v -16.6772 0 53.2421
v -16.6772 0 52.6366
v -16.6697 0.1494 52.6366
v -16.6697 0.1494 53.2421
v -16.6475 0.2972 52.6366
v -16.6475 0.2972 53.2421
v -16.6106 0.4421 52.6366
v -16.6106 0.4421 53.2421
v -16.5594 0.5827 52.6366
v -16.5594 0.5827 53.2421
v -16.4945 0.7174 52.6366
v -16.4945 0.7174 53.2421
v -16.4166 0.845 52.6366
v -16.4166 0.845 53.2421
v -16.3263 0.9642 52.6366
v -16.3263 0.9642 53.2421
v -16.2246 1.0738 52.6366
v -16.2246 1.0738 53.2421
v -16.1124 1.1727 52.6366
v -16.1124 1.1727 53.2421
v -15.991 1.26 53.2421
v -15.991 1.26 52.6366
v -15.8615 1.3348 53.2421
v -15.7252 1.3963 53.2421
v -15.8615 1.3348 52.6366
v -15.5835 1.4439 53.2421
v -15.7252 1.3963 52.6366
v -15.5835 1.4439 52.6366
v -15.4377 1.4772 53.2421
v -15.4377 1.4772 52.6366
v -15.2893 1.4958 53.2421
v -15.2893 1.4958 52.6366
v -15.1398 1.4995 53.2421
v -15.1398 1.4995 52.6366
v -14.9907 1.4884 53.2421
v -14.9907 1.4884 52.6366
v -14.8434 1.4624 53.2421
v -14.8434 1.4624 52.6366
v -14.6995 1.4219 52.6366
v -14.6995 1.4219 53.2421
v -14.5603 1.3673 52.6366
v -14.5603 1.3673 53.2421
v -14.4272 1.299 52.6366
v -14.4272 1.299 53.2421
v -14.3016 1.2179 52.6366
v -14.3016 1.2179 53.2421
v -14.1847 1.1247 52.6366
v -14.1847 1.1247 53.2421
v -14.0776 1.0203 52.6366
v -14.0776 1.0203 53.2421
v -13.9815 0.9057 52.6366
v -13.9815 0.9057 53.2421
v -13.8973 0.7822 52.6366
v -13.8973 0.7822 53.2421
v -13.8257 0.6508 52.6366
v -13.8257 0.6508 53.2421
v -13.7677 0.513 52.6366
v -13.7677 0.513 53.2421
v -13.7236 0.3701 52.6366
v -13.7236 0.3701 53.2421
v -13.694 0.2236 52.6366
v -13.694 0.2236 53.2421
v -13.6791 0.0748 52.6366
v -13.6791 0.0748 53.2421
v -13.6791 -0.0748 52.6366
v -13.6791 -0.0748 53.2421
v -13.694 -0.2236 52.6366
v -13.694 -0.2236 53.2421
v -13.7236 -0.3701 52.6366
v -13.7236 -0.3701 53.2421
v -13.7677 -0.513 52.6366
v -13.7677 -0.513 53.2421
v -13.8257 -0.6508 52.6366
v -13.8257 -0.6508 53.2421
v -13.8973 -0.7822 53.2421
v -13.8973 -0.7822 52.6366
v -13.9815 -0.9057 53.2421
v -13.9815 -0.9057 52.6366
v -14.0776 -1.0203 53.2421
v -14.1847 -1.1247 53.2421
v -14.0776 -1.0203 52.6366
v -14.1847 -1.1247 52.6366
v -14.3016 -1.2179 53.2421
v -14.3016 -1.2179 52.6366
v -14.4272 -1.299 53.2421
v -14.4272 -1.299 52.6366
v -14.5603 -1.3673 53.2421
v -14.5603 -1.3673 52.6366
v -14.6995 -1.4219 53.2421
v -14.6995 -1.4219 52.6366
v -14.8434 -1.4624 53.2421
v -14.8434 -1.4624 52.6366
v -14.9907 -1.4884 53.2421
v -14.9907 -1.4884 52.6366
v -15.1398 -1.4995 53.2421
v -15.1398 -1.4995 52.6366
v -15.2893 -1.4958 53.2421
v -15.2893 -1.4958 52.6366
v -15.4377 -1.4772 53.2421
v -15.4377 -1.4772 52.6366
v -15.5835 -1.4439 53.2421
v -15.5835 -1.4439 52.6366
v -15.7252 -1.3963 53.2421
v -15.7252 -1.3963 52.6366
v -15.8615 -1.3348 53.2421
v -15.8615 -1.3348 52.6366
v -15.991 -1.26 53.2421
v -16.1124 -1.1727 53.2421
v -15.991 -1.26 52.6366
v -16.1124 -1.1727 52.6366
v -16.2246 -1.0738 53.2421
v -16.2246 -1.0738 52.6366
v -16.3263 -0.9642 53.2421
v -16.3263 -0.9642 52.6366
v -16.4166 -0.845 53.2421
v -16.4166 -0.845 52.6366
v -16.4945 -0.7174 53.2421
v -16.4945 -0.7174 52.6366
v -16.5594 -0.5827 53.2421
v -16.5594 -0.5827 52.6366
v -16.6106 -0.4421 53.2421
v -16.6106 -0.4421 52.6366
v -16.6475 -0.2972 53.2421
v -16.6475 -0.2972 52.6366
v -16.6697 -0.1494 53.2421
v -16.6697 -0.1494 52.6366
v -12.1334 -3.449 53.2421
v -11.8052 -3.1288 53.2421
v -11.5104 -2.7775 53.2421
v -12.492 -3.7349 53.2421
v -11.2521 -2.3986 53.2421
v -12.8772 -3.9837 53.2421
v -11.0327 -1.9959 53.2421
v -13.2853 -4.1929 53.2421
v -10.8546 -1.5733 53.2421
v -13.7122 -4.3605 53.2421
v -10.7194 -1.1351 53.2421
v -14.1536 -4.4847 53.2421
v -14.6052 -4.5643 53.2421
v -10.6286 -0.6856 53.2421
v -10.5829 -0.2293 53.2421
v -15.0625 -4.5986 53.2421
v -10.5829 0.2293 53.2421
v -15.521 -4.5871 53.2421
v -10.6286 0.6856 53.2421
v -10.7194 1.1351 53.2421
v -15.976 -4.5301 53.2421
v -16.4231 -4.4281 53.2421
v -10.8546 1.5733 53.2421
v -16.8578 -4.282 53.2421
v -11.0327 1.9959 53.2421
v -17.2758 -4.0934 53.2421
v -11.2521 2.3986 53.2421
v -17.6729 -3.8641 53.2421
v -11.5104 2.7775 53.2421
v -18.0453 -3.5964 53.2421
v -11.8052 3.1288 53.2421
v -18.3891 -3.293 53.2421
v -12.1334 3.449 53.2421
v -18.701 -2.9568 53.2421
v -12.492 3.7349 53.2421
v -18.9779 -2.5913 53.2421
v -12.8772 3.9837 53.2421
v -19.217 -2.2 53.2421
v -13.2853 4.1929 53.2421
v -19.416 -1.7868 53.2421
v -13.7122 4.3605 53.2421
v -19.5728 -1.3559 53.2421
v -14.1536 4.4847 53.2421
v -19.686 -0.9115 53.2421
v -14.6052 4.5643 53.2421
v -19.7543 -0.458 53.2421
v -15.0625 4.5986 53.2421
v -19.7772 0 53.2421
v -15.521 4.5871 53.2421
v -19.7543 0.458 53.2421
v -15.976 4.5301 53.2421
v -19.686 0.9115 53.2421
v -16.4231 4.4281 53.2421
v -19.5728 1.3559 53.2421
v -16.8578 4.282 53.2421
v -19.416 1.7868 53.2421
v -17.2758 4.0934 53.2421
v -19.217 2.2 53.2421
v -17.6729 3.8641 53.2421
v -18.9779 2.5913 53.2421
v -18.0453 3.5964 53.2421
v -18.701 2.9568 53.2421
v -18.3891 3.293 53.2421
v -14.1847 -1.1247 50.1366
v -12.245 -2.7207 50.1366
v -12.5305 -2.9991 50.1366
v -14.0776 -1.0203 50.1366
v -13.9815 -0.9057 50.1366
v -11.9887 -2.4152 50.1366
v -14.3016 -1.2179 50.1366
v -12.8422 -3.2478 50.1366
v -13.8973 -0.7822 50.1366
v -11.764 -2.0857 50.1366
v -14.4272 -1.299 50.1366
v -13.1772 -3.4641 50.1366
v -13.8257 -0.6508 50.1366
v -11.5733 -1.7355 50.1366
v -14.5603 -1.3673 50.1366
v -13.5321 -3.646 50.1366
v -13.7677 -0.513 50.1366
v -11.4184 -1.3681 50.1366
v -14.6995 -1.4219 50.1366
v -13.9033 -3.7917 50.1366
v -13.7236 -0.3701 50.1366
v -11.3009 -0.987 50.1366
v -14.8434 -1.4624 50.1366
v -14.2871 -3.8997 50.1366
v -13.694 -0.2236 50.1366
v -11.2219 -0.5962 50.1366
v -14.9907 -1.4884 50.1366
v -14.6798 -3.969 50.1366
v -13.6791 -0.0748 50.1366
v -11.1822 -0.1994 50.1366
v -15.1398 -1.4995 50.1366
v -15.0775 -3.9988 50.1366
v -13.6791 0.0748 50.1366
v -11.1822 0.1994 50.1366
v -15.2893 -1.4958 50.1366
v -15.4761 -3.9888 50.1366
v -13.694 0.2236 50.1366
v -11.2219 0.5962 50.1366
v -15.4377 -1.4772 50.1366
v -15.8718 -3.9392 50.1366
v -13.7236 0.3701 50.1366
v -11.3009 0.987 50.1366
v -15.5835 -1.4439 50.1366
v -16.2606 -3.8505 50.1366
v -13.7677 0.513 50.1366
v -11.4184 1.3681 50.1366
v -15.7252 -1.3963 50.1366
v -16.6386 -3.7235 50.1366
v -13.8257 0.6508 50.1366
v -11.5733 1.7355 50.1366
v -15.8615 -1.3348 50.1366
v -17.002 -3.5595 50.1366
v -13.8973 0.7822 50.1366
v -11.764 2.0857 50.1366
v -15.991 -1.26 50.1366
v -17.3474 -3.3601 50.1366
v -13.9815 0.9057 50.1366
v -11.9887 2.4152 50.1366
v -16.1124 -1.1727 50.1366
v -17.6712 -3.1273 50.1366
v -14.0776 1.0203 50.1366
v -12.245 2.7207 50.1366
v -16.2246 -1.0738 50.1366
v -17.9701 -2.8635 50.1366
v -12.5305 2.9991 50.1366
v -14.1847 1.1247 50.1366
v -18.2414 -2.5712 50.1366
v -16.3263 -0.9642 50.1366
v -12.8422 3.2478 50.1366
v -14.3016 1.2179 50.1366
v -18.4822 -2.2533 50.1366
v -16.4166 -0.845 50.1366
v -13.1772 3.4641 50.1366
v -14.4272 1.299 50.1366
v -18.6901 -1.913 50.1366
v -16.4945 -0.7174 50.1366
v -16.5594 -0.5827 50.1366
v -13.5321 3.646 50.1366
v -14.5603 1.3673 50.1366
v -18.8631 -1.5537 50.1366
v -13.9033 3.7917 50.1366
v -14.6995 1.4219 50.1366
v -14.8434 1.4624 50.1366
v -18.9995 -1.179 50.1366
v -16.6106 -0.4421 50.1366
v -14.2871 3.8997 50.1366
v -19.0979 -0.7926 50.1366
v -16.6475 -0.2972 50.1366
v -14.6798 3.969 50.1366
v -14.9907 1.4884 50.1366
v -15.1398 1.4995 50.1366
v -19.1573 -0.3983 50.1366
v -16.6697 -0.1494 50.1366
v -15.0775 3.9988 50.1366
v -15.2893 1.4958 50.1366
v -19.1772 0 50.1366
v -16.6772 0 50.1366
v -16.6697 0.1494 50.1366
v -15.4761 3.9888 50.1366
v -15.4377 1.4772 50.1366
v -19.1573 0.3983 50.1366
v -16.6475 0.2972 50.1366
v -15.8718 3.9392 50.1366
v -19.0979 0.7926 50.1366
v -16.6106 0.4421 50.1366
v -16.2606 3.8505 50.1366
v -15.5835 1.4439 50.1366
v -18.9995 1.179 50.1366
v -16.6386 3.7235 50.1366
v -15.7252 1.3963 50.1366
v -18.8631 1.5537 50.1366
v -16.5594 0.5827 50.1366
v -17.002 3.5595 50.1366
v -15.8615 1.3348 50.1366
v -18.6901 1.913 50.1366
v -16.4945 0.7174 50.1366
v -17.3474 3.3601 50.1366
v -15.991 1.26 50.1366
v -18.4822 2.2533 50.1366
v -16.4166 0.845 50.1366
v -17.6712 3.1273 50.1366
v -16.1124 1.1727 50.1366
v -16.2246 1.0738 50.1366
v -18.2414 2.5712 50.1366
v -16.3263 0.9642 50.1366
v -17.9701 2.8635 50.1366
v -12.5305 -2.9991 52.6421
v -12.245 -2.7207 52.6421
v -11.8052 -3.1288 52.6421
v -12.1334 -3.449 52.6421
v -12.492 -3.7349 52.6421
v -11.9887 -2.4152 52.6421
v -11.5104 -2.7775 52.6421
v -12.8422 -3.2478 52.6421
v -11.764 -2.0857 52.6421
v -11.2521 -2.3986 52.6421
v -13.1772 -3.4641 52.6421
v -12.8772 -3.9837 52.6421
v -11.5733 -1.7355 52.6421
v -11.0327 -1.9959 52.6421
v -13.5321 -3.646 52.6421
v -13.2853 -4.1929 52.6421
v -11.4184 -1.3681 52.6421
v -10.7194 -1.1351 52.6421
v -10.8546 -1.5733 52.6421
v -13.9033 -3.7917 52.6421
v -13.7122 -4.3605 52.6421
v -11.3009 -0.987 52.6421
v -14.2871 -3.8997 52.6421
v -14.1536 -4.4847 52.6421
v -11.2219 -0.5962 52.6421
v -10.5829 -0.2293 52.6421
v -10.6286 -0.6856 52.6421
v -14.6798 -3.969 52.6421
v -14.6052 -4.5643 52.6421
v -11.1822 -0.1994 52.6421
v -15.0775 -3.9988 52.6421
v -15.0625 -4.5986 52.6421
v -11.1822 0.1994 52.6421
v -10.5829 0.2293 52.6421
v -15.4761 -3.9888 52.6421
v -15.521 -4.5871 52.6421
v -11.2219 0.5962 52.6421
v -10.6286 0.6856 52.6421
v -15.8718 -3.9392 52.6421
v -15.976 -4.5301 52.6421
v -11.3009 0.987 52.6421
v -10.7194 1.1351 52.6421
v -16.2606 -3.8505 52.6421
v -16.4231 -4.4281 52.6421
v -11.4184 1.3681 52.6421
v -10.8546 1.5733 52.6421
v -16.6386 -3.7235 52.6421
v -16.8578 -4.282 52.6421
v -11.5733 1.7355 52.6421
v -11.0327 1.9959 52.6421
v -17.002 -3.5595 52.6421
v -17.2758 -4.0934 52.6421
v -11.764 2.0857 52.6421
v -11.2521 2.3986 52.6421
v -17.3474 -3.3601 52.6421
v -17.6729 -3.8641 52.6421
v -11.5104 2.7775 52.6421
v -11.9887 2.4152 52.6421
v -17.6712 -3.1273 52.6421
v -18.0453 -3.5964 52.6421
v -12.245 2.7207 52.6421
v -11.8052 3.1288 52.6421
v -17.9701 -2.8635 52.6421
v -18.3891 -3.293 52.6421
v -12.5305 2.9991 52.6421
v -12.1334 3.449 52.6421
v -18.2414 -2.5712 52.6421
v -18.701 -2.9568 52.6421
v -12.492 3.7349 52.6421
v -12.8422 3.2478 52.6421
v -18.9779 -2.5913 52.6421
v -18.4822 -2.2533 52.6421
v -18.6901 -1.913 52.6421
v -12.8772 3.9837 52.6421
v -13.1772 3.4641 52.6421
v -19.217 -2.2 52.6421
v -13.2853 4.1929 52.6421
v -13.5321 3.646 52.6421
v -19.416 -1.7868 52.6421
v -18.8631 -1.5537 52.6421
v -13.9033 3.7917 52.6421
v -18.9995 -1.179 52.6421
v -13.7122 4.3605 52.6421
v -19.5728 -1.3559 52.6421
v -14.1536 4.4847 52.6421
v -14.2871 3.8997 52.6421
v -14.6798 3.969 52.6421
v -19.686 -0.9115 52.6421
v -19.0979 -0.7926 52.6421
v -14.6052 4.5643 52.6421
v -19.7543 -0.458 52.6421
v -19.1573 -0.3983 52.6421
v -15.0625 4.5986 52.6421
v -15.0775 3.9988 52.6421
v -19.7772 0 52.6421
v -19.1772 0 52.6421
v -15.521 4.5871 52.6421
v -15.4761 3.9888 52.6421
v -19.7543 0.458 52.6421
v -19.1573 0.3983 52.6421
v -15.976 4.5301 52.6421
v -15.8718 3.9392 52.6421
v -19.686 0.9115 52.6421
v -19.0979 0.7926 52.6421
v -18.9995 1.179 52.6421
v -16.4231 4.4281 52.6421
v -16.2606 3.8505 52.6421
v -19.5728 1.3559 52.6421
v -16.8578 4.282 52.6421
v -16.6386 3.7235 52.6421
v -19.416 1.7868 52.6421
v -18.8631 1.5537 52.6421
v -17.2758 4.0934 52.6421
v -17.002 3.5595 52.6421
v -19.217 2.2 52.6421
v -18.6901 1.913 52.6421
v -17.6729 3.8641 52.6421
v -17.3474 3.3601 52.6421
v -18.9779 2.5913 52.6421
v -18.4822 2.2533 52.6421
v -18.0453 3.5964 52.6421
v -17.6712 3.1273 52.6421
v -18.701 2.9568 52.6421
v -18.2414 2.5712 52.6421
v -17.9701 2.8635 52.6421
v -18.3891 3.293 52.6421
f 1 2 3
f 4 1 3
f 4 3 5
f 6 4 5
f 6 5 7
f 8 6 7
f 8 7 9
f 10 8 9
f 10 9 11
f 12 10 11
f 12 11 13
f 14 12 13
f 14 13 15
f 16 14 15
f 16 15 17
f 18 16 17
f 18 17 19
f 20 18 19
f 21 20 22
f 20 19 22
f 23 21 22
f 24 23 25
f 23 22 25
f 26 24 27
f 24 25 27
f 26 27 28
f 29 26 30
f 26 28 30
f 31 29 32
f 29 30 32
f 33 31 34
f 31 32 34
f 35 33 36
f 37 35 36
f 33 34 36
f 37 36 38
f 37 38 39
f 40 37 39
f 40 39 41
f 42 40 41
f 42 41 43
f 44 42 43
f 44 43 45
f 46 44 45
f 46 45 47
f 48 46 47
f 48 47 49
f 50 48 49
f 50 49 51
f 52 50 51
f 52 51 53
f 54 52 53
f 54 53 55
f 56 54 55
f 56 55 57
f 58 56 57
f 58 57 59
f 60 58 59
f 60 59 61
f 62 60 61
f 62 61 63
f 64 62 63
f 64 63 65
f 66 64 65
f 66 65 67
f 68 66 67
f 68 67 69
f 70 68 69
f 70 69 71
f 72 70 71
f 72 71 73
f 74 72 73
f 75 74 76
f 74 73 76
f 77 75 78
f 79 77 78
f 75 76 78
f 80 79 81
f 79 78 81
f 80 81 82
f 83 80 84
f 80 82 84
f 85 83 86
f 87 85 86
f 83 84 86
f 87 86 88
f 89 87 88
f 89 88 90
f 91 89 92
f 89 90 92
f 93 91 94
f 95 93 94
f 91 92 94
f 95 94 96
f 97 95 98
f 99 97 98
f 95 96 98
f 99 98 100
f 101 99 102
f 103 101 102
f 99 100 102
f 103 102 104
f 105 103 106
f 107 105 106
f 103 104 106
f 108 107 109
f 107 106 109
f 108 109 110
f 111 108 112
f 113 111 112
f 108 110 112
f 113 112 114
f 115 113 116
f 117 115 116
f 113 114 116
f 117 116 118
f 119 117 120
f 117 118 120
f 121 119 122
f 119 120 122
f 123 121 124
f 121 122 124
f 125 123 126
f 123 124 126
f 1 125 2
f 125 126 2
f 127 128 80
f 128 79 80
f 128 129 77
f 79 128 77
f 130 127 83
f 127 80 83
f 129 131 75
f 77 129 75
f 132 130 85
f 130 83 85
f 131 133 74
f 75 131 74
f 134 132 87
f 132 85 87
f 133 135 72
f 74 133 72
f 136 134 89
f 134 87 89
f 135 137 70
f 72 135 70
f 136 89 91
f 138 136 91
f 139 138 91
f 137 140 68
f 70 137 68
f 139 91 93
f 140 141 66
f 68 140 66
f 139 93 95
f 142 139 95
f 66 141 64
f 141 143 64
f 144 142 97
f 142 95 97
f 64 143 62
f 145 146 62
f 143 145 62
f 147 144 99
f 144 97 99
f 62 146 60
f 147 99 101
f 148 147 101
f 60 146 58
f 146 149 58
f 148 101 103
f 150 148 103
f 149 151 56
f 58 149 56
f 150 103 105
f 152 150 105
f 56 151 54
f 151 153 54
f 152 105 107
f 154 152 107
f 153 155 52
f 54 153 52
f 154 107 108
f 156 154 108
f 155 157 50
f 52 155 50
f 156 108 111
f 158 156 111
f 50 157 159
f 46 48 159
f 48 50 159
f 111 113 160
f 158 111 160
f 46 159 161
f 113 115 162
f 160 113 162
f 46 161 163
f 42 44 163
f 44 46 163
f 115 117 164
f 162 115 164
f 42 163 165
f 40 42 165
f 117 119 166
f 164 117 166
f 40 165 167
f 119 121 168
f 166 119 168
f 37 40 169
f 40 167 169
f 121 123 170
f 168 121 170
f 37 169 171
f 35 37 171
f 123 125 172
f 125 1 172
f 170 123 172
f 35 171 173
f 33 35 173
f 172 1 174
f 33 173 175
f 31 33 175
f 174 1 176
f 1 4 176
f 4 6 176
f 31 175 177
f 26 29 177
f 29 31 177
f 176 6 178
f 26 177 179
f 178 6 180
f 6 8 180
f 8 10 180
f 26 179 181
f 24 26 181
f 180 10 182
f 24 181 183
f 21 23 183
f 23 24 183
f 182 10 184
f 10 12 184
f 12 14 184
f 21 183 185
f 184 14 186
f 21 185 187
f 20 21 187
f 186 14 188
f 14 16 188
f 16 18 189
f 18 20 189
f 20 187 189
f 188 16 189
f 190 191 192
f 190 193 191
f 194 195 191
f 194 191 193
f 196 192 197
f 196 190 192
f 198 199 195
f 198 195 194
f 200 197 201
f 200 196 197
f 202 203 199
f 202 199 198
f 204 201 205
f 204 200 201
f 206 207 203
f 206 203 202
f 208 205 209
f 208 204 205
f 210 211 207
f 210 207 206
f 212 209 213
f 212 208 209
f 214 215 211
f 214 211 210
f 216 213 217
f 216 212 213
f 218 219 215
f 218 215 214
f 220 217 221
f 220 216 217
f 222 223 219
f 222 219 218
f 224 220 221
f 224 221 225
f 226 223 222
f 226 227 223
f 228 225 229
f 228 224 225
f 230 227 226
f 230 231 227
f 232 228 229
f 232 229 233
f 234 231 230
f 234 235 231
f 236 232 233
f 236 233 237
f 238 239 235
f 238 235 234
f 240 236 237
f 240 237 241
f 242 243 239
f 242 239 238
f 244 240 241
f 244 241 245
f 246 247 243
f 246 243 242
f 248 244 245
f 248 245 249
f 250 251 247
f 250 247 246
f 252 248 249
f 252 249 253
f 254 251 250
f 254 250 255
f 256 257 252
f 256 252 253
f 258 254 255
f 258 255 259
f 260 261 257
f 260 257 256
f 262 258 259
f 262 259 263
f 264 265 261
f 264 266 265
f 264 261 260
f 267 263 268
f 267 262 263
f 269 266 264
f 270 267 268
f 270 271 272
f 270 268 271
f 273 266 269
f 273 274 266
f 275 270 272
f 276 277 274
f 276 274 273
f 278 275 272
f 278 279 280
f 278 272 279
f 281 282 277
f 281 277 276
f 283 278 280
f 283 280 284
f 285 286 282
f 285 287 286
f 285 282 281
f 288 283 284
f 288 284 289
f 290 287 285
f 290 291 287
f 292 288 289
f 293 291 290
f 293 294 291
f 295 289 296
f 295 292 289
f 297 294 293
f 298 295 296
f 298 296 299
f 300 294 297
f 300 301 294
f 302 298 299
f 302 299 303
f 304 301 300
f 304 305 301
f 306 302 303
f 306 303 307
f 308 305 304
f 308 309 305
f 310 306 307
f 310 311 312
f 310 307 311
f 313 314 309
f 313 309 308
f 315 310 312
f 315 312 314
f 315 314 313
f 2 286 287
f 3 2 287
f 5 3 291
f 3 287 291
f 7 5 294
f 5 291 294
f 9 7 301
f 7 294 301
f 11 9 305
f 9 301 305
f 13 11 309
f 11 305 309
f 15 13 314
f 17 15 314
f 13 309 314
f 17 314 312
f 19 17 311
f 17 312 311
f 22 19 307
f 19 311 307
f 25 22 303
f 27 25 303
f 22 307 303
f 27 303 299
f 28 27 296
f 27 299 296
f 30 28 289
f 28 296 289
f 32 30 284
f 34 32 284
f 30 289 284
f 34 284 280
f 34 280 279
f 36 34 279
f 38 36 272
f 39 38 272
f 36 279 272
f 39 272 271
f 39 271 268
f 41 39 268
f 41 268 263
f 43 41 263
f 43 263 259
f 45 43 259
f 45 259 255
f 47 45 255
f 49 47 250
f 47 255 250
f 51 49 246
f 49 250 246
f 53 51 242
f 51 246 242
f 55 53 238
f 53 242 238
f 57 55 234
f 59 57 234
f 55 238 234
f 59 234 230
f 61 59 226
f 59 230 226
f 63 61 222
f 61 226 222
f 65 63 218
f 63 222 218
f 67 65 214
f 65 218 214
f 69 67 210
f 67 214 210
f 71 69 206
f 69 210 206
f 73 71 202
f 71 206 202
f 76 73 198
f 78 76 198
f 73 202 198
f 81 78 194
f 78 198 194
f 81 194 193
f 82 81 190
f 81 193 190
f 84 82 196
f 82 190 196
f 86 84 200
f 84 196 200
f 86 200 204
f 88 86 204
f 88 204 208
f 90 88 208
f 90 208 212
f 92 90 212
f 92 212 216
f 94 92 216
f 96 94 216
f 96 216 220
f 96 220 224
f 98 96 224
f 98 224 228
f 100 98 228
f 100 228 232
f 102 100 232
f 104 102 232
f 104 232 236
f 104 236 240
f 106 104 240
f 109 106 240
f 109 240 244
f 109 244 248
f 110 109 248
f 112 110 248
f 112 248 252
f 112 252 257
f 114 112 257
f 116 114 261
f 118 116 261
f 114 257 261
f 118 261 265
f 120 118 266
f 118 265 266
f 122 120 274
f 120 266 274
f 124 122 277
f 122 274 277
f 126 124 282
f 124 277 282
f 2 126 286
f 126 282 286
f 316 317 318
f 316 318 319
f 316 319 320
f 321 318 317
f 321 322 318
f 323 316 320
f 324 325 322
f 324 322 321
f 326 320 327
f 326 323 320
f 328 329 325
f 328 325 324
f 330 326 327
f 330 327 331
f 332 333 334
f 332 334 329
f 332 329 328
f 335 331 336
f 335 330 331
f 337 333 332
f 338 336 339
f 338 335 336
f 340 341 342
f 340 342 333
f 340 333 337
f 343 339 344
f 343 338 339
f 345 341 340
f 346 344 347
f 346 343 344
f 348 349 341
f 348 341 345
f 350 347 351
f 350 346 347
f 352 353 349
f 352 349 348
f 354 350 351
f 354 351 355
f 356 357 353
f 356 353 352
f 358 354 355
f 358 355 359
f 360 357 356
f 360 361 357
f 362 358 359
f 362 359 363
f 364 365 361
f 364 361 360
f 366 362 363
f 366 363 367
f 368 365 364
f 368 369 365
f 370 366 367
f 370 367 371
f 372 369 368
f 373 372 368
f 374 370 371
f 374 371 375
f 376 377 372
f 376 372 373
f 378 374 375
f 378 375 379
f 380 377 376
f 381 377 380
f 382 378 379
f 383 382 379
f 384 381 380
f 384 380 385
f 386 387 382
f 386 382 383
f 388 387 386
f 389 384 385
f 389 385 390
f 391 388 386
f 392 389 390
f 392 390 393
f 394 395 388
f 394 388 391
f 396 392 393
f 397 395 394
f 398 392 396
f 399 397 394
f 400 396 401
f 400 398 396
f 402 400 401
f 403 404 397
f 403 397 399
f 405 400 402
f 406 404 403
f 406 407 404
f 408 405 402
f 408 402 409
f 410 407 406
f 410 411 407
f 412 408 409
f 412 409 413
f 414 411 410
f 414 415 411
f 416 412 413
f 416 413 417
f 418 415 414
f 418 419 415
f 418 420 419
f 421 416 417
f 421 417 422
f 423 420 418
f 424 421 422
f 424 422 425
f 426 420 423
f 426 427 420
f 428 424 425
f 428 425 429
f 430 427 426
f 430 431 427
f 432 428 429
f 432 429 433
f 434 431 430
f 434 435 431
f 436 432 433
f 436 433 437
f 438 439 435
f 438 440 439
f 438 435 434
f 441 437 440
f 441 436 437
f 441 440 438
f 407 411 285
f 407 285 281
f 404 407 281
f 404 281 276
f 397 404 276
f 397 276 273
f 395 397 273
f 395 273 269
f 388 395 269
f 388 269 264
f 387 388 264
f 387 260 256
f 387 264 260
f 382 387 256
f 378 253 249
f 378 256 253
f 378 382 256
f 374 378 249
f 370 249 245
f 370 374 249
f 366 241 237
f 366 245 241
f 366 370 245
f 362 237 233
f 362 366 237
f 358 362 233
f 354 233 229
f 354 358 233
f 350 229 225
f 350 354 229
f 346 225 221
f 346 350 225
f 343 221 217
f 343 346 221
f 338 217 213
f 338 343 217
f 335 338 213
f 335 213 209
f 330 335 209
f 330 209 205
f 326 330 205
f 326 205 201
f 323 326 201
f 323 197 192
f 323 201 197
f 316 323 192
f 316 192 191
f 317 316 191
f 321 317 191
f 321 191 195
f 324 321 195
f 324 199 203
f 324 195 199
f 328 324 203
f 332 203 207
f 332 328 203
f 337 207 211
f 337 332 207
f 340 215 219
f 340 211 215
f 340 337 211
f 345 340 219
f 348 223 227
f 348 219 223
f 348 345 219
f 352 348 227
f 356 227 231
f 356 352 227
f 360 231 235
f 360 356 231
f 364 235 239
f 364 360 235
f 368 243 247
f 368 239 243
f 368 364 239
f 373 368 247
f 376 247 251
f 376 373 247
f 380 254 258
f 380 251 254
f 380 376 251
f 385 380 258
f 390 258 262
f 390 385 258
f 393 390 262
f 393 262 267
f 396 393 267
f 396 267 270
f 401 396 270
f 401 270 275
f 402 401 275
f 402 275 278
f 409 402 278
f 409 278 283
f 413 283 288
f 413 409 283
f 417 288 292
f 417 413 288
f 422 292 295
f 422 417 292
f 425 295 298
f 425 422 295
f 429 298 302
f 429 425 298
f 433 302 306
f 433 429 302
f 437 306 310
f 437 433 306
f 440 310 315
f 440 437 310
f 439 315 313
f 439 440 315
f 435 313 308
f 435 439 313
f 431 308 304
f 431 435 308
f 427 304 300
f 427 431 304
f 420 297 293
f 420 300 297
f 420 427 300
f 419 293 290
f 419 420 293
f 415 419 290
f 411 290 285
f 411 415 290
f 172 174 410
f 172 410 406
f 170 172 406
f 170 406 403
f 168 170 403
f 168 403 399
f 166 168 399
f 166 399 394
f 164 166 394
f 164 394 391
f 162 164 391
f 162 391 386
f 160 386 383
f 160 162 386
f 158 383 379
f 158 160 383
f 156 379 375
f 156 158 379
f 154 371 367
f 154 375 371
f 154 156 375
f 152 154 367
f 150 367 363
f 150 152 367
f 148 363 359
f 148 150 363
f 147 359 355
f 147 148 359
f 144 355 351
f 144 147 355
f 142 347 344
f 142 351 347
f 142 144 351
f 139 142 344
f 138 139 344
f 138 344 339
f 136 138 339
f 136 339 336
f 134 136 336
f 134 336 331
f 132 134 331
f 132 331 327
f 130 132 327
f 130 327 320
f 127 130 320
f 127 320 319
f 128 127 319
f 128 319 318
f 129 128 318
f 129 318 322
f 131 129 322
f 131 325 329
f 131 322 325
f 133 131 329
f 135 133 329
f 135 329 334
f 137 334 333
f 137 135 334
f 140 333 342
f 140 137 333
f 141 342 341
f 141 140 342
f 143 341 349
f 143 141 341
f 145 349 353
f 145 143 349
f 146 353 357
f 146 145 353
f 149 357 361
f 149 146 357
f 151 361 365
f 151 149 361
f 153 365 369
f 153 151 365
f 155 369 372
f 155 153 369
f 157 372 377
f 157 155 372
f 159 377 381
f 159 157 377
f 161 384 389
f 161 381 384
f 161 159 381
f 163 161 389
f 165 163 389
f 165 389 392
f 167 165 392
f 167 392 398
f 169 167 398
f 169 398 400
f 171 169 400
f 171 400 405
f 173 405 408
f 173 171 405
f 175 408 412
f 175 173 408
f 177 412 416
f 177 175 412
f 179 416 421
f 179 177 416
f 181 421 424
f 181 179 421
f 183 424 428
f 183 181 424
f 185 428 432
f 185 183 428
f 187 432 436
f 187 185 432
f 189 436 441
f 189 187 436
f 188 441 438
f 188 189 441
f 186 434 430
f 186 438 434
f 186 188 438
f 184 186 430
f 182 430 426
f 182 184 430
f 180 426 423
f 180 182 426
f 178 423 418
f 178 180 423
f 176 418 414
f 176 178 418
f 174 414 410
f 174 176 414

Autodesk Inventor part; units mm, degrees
ref_plane "YZ Plane" through (0, 0, 0) normal (1, 0, 0) x (0, 1, 0)
ref_plane "XZ Plane" through (0, 0, 0) normal (0, 1, 0) x (-1, 0, 0)
ref_plane "XY Plane" through (0, 0, 0) normal (0, 0, 1) x (1, 0, 0)
sketch "Sketch1" plane through (0, 0, 0) normal (0, 1, 0) x (-1, 0, 0)
  line L0 (16.6772, 52.6366) -> (16.6772, 50.1366)
  line L1 (16.6772, 50.1366) -> (19.1772, 50.1366)
  line L2 (19.1772, 50.1366) -> (19.1772, 52.6421)
  line L3 (19.1772, 52.6421) -> (19.7772, 52.6421)
  line L4 (19.7772, 52.6421) -> (19.7772, 53.2421)
  line L5 (19.7772, 53.2421) -> (16.6772, 53.2421)
  line L6 (16.6772, 53.2421) -> (16.6772, 52.6366)
  line L7 (15.1772, 53.2421) -> (15.1772, 48.9703)
  point P0 (0, 0)
  dimension "d0" = 2.5
  dimension "d1" = 1.5
  dimension "d2" = 2.5
  dimension "d3" = 0.6
  dimension "d4" = 0.6
  dimension "d5" = 0
revolve "Revolution1" add sketch "Sketch1" angle 360 about axis through (-15.1772, 0, 53.2421) along (0, 0, -1)
properties part number "00_ballbearing_8mm"
